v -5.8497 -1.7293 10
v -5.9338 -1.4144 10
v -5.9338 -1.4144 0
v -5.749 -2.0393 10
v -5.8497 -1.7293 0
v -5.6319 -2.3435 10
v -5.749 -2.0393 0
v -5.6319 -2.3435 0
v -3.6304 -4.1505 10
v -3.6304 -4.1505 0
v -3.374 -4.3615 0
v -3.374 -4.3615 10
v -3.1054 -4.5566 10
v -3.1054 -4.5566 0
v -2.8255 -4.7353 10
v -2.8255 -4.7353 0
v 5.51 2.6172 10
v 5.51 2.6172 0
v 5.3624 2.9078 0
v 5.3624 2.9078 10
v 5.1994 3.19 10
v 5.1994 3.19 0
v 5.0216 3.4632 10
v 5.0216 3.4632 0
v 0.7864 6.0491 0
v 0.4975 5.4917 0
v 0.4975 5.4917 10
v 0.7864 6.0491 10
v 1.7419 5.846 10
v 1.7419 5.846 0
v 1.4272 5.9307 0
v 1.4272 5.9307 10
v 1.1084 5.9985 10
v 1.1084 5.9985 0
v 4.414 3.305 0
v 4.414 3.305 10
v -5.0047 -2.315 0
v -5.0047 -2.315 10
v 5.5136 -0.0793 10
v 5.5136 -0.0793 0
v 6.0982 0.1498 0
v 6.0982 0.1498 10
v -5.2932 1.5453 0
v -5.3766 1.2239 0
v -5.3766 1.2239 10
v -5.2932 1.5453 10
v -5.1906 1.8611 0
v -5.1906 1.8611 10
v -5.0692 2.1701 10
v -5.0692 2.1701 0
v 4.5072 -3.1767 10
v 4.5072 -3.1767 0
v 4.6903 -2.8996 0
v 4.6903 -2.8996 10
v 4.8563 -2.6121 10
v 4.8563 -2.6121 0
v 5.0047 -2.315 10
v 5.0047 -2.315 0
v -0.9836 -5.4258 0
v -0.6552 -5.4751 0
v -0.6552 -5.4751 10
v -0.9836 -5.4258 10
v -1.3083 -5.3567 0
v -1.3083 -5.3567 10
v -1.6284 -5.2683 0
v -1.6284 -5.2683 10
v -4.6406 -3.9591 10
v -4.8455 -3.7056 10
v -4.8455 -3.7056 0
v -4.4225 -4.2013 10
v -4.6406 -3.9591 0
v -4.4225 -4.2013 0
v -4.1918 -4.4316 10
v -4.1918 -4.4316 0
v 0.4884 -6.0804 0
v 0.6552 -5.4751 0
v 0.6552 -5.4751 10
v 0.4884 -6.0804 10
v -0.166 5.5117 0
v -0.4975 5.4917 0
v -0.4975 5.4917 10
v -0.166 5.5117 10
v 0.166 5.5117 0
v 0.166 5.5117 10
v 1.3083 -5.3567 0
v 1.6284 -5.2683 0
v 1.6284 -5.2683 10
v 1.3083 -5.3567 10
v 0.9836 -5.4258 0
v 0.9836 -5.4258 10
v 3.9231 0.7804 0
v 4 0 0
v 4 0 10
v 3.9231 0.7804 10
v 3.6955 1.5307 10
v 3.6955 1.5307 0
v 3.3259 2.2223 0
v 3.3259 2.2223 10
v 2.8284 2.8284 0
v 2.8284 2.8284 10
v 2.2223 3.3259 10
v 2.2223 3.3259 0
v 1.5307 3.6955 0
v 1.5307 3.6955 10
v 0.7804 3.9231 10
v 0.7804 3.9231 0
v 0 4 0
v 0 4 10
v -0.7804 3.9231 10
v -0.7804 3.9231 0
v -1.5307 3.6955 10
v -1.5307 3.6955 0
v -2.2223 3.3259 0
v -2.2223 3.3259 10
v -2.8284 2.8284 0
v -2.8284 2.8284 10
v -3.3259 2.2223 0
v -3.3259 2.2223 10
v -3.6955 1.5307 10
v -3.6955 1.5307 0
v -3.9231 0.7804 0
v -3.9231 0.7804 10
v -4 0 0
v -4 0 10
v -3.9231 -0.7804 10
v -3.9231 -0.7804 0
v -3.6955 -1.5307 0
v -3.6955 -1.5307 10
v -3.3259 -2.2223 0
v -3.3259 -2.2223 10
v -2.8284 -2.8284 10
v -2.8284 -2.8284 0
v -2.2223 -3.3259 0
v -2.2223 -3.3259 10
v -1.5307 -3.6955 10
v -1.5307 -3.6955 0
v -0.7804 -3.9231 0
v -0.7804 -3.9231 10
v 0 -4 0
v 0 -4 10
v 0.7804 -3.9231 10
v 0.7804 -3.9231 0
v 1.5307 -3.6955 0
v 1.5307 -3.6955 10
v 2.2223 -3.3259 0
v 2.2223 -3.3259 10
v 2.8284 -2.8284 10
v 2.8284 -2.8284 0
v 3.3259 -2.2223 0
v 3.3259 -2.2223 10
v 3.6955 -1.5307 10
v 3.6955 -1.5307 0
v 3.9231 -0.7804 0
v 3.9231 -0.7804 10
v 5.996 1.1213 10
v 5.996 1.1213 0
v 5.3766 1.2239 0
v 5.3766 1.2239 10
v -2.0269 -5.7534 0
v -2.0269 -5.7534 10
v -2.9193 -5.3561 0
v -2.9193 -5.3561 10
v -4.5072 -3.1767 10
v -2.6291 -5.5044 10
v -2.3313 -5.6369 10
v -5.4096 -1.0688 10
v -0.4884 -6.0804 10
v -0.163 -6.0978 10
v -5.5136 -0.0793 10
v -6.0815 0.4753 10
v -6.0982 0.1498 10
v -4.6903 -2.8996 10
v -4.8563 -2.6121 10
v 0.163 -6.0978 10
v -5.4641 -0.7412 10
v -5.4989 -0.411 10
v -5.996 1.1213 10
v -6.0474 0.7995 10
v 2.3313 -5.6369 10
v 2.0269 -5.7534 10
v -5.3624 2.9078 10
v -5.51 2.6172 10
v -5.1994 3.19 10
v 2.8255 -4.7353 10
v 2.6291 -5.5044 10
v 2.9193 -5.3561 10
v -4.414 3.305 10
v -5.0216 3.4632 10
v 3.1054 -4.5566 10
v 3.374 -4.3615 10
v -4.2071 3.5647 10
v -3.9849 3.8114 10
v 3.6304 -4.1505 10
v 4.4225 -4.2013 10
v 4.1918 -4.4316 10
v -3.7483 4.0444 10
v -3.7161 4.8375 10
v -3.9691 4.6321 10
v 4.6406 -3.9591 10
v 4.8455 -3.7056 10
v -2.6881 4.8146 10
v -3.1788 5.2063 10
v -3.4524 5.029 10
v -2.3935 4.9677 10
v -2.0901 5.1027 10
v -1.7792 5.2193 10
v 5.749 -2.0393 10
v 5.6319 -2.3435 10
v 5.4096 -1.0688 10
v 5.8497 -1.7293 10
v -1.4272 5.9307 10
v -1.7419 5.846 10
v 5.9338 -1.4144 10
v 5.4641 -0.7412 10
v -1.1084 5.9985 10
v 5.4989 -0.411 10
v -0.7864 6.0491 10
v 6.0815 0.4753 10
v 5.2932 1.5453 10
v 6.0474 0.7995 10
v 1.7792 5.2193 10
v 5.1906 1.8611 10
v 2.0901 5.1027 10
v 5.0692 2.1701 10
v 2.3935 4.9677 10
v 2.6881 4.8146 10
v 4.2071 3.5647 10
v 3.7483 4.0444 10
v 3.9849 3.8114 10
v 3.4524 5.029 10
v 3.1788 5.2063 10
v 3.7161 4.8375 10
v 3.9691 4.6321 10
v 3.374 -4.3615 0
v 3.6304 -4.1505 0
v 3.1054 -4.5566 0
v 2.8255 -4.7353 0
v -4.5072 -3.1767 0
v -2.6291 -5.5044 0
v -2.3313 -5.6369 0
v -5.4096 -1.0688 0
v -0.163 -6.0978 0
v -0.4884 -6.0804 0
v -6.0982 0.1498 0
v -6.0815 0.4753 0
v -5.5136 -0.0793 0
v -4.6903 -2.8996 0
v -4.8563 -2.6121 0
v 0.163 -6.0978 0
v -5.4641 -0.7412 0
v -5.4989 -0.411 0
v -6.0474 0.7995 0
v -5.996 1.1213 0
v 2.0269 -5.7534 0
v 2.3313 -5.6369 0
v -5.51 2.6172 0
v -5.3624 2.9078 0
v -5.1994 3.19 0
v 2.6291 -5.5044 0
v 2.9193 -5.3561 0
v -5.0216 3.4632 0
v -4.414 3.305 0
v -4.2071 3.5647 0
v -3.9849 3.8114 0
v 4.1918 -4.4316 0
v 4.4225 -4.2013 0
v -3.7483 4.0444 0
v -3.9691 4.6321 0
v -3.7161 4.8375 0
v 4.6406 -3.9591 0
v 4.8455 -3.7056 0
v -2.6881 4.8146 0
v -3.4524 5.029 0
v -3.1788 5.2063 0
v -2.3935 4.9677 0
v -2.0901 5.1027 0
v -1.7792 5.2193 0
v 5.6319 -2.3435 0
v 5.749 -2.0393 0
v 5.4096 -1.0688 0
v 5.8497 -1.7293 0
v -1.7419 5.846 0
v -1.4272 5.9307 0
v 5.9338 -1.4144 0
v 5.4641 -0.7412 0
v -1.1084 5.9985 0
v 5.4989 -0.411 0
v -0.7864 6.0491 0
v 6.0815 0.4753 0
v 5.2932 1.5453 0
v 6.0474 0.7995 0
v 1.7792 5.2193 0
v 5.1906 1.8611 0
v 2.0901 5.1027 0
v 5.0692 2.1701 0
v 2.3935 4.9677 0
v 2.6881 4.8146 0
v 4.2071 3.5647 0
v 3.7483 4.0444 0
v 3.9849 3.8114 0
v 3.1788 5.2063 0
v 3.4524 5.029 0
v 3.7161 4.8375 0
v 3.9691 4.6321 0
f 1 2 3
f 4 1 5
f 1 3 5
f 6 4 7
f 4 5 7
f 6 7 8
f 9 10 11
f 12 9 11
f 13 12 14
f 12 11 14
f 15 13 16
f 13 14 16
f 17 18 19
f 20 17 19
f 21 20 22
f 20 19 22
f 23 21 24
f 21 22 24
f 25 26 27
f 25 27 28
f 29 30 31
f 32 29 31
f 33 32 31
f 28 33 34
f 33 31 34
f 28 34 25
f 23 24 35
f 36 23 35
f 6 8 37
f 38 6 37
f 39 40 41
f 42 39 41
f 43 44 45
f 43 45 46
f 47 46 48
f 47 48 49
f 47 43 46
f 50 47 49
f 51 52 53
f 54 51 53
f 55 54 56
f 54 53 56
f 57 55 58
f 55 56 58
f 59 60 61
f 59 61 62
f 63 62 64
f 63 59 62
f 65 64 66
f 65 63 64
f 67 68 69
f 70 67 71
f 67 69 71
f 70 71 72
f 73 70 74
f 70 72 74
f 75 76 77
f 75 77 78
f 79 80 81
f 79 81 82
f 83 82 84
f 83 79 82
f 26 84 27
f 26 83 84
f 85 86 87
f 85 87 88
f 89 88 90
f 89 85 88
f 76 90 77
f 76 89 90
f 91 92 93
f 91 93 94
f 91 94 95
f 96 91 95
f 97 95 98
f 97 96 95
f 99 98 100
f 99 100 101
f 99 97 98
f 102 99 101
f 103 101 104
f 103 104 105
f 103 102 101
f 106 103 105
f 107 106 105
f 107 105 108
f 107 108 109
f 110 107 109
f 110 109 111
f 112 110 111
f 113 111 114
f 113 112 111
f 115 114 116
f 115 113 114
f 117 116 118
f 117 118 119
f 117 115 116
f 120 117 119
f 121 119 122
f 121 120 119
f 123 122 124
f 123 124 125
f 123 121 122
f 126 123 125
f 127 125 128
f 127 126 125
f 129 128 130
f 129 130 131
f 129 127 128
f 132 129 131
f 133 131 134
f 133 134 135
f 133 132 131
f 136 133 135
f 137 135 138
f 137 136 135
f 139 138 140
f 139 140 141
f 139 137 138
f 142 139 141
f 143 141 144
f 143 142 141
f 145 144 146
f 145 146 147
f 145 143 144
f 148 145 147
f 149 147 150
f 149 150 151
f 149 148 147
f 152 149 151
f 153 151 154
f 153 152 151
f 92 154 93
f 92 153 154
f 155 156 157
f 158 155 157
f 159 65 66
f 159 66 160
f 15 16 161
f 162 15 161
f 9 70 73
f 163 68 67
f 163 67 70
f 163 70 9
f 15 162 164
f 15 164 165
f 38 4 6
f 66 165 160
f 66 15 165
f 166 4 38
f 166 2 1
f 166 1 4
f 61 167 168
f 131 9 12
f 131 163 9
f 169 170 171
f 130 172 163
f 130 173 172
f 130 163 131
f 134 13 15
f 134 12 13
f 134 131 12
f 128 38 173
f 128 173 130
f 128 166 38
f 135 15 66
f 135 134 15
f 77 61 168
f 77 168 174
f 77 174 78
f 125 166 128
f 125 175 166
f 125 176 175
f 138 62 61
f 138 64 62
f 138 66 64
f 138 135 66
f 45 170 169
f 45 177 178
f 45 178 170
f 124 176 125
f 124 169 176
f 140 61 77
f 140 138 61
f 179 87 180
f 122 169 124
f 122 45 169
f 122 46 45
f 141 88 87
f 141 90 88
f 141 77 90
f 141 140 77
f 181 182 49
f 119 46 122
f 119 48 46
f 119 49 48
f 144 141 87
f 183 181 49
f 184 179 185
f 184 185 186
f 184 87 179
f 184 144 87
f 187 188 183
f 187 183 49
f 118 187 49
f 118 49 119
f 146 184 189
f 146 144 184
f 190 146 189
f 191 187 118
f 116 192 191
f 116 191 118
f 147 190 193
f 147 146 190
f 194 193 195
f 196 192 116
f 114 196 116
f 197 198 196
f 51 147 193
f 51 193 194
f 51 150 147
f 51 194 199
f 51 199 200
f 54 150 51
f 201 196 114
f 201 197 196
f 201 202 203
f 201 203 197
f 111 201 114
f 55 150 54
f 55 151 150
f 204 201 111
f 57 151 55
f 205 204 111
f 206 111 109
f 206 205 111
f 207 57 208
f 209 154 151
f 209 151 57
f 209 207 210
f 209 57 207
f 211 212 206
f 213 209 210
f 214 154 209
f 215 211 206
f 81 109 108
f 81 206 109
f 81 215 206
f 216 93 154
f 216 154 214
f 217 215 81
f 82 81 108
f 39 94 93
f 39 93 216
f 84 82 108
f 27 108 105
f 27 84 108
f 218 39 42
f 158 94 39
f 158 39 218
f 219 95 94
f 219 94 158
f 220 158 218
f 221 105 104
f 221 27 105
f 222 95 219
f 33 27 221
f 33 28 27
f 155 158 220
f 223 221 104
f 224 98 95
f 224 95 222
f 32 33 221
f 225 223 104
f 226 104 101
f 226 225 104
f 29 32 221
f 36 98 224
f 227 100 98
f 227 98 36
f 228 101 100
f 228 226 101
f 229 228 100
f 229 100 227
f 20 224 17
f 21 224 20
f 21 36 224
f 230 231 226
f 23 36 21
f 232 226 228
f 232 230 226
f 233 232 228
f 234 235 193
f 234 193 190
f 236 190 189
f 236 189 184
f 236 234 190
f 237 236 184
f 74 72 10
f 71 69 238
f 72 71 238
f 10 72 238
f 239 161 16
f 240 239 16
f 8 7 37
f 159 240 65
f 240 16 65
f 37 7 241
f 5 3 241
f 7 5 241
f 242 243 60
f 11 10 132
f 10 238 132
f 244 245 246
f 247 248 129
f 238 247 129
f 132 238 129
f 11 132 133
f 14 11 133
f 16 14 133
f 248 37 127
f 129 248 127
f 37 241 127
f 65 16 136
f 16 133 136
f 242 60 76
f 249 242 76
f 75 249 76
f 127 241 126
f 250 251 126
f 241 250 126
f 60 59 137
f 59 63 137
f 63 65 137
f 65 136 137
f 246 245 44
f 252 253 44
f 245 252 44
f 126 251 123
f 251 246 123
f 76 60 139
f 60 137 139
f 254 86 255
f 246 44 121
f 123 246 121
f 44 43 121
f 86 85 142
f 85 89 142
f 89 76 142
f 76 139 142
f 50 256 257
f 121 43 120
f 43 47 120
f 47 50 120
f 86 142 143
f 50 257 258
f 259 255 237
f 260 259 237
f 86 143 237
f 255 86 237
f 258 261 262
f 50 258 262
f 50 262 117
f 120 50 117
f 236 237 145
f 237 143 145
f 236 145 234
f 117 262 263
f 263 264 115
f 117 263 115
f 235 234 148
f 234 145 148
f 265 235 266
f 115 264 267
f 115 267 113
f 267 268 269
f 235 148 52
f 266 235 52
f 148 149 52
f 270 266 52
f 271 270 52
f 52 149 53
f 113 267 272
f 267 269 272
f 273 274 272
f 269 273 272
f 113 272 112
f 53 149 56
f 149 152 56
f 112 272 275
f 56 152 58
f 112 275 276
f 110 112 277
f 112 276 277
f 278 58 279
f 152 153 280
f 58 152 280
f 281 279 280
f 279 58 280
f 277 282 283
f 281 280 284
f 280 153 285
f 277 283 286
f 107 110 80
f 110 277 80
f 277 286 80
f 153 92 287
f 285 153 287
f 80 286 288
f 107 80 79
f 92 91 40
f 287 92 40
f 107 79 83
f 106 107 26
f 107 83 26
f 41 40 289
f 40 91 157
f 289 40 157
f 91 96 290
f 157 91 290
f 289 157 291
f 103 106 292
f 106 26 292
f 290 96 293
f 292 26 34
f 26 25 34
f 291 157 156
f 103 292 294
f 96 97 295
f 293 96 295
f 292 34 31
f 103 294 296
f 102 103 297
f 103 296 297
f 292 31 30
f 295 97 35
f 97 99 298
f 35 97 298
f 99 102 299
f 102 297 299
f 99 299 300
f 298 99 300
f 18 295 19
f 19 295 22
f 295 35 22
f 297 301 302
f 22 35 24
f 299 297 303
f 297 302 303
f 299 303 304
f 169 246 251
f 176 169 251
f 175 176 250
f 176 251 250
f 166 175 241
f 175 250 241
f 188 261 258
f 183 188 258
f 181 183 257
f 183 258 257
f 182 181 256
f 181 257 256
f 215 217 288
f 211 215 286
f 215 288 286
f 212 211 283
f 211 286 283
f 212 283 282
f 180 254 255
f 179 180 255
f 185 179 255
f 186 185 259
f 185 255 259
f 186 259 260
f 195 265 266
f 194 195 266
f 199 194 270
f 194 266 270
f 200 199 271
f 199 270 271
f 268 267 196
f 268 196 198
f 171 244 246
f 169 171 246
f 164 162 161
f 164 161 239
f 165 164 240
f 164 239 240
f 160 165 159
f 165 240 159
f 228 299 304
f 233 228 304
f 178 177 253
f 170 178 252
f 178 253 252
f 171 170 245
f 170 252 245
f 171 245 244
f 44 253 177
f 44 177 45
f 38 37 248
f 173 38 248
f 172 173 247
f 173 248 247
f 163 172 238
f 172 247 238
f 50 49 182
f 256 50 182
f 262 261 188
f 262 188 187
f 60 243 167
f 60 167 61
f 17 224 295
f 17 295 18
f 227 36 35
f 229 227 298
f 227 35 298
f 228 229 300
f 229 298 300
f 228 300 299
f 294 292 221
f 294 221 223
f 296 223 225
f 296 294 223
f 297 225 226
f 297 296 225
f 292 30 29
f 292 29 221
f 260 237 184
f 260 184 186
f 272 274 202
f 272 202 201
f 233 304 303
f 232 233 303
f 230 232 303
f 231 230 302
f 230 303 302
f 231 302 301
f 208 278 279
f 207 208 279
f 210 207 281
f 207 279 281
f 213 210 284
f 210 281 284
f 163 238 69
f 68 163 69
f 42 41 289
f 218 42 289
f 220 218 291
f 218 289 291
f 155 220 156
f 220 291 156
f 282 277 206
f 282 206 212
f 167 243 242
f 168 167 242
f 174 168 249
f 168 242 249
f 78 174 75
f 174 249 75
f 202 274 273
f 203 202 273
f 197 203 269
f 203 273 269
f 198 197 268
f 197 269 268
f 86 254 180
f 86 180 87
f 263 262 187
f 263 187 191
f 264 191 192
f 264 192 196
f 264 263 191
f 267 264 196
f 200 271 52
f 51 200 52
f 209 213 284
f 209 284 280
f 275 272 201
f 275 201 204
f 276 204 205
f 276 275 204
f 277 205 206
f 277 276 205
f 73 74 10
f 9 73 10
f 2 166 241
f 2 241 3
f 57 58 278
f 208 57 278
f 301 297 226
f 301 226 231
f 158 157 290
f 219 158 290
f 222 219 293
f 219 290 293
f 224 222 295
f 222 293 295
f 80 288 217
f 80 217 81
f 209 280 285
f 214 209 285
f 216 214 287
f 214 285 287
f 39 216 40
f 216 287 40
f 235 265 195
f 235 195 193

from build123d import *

# Parameters (mm, degrees)
ESQUISSE1_R                  = 6.1
ESQUISSE1_R_2                = 4
BOSS_EXTRU_1_DEPTH           = 10
ENL_V_MAT_EXTRU_1_DEPTH      = 12
ENL_V_MAT_EXTRU_1_DEPTH_BACK = 1


with BuildPart() as part:
    # Esquisse1 → Boss.-Extru.1 (new body)
    with BuildSketch(Plane.XY):
        Circle(ESQUISSE1_R)
        Circle(ESQUISSE1_R_2, mode=Mode.SUBTRACT)
    extrude(amount=BOSS_EXTRU_1_DEPTH)

    # Esquisse3 → Enlèv. mat.-Extru.1 (cut, two sides)
    with BuildSketch(Plane.XY) as enl_v_mat_extru_1_sk:
        with BuildLine():
            Line((-4.507231971, -3.176663454), (-4.845452386, -3.705616166))
            ThreePointArc((-4.845452386, -3.705616166), (-5.282754963, -3.05), (-5.63188393, -2.343476776))
            Line((-5.63188393, -2.343476776), (-5.004687237, -2.315045661))
            ThreePointArc((-5.004687237, -2.315045661), (-4.775431715, -2.757096786), (-4.507231971, -3.176663454))
        make_face()
        with BuildLine():
            Line((-5.409626724, -1.068770068), (-5.933750898, -1.414425779))
            ThreePointArc((-5.933750898, -1.414425779), (-6.066583562, -0.637623626), (-6.098159859, 0.149821))
            Line((-6.098159859, 0.149821), (-5.513623192, -0.079309761))
            ThreePointArc((-5.513623192, -0.079309761), (-5.483986242, -0.57639018), (-5.409626724, -1.068770068))
        make_face()
        with BuildLine():
            ThreePointArc((-4.413997755, 3.304989344), (-4.09784442, 3.689715688), (-3.748272669, 4.044351956))
            Line((-3.748272669, 4.044351956), (-3.969126703, 4.632065761))
            ThreePointArc((-3.969126703, 4.632065761), (-4.533183435, 4.081696699), (-5.021577535, 3.463200696))
            Line((-5.021577535, 3.463200696), (-4.413997755, 3.304989344))
        make_face()
        with BuildLine():
            ThreePointArc((-2.688127328, 4.814592632), (-2.242824583, 5.03746649), (-1.779231332, 5.219259201))
            Line((-1.779231332, 5.219259201), (-1.741946793, 5.845991907))
            ThreePointArc((-1.741946793, 5.845991907), (-2.481093523, 5.572627292), (-3.178828722, 5.206250854))
            Line((-3.178828722, 5.206250854), (-2.688127328, 4.814592632))
        make_face()
        with BuildLine():
            Line((0.497455265, 5.491709115), (0.786431544, 6.049092943))
            ThreePointArc((0.786431544, 6.049092943), (0, 6.1), (-0.786431544, 6.049092943))
            Line((-0.786431544, 6.049092943), (-0.497455265, 5.491709115))
            ThreePointArc((-0.497455265, 5.491709115), (0, 5.514193572), (0.497455265, 5.491709115))
        make_face()
        with BuildLine():
            Line((2.688127328, 4.814592632), (3.178828722, 5.206250854))
            ThreePointArc((3.178828722, 5.206250854), (2.481093523, 5.572627292), (1.741946793, 5.845991907))
            Line((1.741946793, 5.845991907), (1.779231332, 5.219259201))
            ThreePointArc((1.779231332, 5.219259201), (2.242824583, 5.03746649), (2.688127328, 4.814592632))
        make_face()
        with BuildLine():
            Line((3.748272669, 4.044351956), (3.969126703, 4.632065761))
            ThreePointArc((3.969126703, 4.632065761), (4.533183435, 4.081696699), (5.021577535, 3.463200696))
            Line((5.021577535, 3.463200696), (4.413997755, 3.304989344))
            ThreePointArc((4.413997755, 3.304989344), (4.09784442, 3.689715688), (3.748272669, 4.044351956))
        make_face()
        with BuildLine():
            Line((-5.069203609, 2.170139516), (-5.510008549, 2.617213364))
            ThreePointArc((-5.510008549, 2.617213364), (-5.801444749, 1.885003666), (-5.996049973, 1.121331676))
            Line((-5.996049973, 1.121331676), (-5.37664787, 1.223923373))
            ThreePointArc((-5.37664787, 1.223923373), (-5.244309729, 1.703979524), (-5.069203609, 2.170139516))
        make_face()
        with BuildLine():
            ThreePointArc((5.510008549, 2.617213364), (5.801444749, 1.885003666), (5.996049973, 1.121331676))
            Line((5.996049973, 1.121331676), (5.37664787, 1.223923373))
            ThreePointArc((5.37664787, 1.223923373), (5.244309729, 1.703979524), (5.069203609, 2.170139516))
            Line((5.069203609, 2.170139516), (5.510008549, 2.617213364))
        make_face()
        with BuildLine():
            Line((5.513623192, -0.079309761), (6.098159859, 0.149821))
            ThreePointArc((6.098159859, 0.149821), (6.066583562, -0.637623626), (5.933750898, -1.414425779))
            Line((5.933750898, -1.414425779), (5.409626724, -1.068770068))
            ThreePointArc((5.409626724, -1.068770068), (5.483986242, -0.57639018), (5.513623192, -0.079309761))
        make_face()
        with BuildLine():
            Line((5.004687237, -2.315045661), (5.63188393, -2.343476776))
            ThreePointArc((5.63188393, -2.343476776), (5.282754963, -3.05), (4.845452386, -3.705616166))
            Line((4.845452386, -3.705616166), (4.507231971, -3.176663454))
            ThreePointArc((4.507231971, -3.176663454), (4.775431715, -2.757096786), (5.004687237, -2.315045661))
        make_face()
        with BuildLine():
            ThreePointArc((3.630395391, -4.150489134), (3.24116166, -4.46107631), (2.825495864, -4.735282871))
            Line((2.825495864, -4.735282871), (2.919331138, -5.356071854))
            ThreePointArc((2.919331138, -5.356071854), (3.585490039, -4.935003666), (4.191804105, -4.431566128))
            Line((4.191804105, -4.431566128), (3.630395391, -4.150489134))
        make_face()
        with BuildLine():
            ThreePointArc((1.628375202, -5.26827533), (1.146465309, -5.393695212), (0.655205854, -5.47512886))
            Line((0.655205854, -5.47512886), (0.488431014, -6.08041406))
            ThreePointArc((0.488431014, -6.08041406), (1.268261314, -5.966700364), (2.026923269, -5.753397436))
            Line((2.026923269, -5.753397436), (1.628375202, -5.26827533))
        make_face()
        with BuildLine():
            ThreePointArc((-0.655205854, -5.47512886), (-1.146465309, -5.393695212), (-1.628375202, -5.26827533))
            Line((-1.628375202, -5.26827533), (-2.026923269, -5.753397436))
            ThreePointArc((-2.026923269, -5.753397436), (-1.268261314, -5.966700364), (-0.488431014, -6.08041406))
            Line((-0.488431014, -6.08041406), (-0.655205854, -5.47512886))
        make_face()
        with BuildLine():
            ThreePointArc((-2.919331138, -5.356071854), (-3.585490039, -4.935003666), (-4.191804105, -4.431566128))
            Line((-4.191804105, -4.431566128), (-3.630395391, -4.150489134))
            ThreePointArc((-3.630395391, -4.150489134), (-3.24116166, -4.46107631), (-2.825495864, -4.735282871))
            Line((-2.825495864, -4.735282871), (-2.919331138, -5.356071854))
        make_face()
    extrude(amount=ENL_V_MAT_EXTRU_1_DEPTH, mode=Mode.SUBTRACT)
    extrude(enl_v_mat_extru_1_sk.sketch, amount=-ENL_V_MAT_EXTRU_1_DEPTH_BACK, mode=Mode.SUBTRACT)


solid = part.part
